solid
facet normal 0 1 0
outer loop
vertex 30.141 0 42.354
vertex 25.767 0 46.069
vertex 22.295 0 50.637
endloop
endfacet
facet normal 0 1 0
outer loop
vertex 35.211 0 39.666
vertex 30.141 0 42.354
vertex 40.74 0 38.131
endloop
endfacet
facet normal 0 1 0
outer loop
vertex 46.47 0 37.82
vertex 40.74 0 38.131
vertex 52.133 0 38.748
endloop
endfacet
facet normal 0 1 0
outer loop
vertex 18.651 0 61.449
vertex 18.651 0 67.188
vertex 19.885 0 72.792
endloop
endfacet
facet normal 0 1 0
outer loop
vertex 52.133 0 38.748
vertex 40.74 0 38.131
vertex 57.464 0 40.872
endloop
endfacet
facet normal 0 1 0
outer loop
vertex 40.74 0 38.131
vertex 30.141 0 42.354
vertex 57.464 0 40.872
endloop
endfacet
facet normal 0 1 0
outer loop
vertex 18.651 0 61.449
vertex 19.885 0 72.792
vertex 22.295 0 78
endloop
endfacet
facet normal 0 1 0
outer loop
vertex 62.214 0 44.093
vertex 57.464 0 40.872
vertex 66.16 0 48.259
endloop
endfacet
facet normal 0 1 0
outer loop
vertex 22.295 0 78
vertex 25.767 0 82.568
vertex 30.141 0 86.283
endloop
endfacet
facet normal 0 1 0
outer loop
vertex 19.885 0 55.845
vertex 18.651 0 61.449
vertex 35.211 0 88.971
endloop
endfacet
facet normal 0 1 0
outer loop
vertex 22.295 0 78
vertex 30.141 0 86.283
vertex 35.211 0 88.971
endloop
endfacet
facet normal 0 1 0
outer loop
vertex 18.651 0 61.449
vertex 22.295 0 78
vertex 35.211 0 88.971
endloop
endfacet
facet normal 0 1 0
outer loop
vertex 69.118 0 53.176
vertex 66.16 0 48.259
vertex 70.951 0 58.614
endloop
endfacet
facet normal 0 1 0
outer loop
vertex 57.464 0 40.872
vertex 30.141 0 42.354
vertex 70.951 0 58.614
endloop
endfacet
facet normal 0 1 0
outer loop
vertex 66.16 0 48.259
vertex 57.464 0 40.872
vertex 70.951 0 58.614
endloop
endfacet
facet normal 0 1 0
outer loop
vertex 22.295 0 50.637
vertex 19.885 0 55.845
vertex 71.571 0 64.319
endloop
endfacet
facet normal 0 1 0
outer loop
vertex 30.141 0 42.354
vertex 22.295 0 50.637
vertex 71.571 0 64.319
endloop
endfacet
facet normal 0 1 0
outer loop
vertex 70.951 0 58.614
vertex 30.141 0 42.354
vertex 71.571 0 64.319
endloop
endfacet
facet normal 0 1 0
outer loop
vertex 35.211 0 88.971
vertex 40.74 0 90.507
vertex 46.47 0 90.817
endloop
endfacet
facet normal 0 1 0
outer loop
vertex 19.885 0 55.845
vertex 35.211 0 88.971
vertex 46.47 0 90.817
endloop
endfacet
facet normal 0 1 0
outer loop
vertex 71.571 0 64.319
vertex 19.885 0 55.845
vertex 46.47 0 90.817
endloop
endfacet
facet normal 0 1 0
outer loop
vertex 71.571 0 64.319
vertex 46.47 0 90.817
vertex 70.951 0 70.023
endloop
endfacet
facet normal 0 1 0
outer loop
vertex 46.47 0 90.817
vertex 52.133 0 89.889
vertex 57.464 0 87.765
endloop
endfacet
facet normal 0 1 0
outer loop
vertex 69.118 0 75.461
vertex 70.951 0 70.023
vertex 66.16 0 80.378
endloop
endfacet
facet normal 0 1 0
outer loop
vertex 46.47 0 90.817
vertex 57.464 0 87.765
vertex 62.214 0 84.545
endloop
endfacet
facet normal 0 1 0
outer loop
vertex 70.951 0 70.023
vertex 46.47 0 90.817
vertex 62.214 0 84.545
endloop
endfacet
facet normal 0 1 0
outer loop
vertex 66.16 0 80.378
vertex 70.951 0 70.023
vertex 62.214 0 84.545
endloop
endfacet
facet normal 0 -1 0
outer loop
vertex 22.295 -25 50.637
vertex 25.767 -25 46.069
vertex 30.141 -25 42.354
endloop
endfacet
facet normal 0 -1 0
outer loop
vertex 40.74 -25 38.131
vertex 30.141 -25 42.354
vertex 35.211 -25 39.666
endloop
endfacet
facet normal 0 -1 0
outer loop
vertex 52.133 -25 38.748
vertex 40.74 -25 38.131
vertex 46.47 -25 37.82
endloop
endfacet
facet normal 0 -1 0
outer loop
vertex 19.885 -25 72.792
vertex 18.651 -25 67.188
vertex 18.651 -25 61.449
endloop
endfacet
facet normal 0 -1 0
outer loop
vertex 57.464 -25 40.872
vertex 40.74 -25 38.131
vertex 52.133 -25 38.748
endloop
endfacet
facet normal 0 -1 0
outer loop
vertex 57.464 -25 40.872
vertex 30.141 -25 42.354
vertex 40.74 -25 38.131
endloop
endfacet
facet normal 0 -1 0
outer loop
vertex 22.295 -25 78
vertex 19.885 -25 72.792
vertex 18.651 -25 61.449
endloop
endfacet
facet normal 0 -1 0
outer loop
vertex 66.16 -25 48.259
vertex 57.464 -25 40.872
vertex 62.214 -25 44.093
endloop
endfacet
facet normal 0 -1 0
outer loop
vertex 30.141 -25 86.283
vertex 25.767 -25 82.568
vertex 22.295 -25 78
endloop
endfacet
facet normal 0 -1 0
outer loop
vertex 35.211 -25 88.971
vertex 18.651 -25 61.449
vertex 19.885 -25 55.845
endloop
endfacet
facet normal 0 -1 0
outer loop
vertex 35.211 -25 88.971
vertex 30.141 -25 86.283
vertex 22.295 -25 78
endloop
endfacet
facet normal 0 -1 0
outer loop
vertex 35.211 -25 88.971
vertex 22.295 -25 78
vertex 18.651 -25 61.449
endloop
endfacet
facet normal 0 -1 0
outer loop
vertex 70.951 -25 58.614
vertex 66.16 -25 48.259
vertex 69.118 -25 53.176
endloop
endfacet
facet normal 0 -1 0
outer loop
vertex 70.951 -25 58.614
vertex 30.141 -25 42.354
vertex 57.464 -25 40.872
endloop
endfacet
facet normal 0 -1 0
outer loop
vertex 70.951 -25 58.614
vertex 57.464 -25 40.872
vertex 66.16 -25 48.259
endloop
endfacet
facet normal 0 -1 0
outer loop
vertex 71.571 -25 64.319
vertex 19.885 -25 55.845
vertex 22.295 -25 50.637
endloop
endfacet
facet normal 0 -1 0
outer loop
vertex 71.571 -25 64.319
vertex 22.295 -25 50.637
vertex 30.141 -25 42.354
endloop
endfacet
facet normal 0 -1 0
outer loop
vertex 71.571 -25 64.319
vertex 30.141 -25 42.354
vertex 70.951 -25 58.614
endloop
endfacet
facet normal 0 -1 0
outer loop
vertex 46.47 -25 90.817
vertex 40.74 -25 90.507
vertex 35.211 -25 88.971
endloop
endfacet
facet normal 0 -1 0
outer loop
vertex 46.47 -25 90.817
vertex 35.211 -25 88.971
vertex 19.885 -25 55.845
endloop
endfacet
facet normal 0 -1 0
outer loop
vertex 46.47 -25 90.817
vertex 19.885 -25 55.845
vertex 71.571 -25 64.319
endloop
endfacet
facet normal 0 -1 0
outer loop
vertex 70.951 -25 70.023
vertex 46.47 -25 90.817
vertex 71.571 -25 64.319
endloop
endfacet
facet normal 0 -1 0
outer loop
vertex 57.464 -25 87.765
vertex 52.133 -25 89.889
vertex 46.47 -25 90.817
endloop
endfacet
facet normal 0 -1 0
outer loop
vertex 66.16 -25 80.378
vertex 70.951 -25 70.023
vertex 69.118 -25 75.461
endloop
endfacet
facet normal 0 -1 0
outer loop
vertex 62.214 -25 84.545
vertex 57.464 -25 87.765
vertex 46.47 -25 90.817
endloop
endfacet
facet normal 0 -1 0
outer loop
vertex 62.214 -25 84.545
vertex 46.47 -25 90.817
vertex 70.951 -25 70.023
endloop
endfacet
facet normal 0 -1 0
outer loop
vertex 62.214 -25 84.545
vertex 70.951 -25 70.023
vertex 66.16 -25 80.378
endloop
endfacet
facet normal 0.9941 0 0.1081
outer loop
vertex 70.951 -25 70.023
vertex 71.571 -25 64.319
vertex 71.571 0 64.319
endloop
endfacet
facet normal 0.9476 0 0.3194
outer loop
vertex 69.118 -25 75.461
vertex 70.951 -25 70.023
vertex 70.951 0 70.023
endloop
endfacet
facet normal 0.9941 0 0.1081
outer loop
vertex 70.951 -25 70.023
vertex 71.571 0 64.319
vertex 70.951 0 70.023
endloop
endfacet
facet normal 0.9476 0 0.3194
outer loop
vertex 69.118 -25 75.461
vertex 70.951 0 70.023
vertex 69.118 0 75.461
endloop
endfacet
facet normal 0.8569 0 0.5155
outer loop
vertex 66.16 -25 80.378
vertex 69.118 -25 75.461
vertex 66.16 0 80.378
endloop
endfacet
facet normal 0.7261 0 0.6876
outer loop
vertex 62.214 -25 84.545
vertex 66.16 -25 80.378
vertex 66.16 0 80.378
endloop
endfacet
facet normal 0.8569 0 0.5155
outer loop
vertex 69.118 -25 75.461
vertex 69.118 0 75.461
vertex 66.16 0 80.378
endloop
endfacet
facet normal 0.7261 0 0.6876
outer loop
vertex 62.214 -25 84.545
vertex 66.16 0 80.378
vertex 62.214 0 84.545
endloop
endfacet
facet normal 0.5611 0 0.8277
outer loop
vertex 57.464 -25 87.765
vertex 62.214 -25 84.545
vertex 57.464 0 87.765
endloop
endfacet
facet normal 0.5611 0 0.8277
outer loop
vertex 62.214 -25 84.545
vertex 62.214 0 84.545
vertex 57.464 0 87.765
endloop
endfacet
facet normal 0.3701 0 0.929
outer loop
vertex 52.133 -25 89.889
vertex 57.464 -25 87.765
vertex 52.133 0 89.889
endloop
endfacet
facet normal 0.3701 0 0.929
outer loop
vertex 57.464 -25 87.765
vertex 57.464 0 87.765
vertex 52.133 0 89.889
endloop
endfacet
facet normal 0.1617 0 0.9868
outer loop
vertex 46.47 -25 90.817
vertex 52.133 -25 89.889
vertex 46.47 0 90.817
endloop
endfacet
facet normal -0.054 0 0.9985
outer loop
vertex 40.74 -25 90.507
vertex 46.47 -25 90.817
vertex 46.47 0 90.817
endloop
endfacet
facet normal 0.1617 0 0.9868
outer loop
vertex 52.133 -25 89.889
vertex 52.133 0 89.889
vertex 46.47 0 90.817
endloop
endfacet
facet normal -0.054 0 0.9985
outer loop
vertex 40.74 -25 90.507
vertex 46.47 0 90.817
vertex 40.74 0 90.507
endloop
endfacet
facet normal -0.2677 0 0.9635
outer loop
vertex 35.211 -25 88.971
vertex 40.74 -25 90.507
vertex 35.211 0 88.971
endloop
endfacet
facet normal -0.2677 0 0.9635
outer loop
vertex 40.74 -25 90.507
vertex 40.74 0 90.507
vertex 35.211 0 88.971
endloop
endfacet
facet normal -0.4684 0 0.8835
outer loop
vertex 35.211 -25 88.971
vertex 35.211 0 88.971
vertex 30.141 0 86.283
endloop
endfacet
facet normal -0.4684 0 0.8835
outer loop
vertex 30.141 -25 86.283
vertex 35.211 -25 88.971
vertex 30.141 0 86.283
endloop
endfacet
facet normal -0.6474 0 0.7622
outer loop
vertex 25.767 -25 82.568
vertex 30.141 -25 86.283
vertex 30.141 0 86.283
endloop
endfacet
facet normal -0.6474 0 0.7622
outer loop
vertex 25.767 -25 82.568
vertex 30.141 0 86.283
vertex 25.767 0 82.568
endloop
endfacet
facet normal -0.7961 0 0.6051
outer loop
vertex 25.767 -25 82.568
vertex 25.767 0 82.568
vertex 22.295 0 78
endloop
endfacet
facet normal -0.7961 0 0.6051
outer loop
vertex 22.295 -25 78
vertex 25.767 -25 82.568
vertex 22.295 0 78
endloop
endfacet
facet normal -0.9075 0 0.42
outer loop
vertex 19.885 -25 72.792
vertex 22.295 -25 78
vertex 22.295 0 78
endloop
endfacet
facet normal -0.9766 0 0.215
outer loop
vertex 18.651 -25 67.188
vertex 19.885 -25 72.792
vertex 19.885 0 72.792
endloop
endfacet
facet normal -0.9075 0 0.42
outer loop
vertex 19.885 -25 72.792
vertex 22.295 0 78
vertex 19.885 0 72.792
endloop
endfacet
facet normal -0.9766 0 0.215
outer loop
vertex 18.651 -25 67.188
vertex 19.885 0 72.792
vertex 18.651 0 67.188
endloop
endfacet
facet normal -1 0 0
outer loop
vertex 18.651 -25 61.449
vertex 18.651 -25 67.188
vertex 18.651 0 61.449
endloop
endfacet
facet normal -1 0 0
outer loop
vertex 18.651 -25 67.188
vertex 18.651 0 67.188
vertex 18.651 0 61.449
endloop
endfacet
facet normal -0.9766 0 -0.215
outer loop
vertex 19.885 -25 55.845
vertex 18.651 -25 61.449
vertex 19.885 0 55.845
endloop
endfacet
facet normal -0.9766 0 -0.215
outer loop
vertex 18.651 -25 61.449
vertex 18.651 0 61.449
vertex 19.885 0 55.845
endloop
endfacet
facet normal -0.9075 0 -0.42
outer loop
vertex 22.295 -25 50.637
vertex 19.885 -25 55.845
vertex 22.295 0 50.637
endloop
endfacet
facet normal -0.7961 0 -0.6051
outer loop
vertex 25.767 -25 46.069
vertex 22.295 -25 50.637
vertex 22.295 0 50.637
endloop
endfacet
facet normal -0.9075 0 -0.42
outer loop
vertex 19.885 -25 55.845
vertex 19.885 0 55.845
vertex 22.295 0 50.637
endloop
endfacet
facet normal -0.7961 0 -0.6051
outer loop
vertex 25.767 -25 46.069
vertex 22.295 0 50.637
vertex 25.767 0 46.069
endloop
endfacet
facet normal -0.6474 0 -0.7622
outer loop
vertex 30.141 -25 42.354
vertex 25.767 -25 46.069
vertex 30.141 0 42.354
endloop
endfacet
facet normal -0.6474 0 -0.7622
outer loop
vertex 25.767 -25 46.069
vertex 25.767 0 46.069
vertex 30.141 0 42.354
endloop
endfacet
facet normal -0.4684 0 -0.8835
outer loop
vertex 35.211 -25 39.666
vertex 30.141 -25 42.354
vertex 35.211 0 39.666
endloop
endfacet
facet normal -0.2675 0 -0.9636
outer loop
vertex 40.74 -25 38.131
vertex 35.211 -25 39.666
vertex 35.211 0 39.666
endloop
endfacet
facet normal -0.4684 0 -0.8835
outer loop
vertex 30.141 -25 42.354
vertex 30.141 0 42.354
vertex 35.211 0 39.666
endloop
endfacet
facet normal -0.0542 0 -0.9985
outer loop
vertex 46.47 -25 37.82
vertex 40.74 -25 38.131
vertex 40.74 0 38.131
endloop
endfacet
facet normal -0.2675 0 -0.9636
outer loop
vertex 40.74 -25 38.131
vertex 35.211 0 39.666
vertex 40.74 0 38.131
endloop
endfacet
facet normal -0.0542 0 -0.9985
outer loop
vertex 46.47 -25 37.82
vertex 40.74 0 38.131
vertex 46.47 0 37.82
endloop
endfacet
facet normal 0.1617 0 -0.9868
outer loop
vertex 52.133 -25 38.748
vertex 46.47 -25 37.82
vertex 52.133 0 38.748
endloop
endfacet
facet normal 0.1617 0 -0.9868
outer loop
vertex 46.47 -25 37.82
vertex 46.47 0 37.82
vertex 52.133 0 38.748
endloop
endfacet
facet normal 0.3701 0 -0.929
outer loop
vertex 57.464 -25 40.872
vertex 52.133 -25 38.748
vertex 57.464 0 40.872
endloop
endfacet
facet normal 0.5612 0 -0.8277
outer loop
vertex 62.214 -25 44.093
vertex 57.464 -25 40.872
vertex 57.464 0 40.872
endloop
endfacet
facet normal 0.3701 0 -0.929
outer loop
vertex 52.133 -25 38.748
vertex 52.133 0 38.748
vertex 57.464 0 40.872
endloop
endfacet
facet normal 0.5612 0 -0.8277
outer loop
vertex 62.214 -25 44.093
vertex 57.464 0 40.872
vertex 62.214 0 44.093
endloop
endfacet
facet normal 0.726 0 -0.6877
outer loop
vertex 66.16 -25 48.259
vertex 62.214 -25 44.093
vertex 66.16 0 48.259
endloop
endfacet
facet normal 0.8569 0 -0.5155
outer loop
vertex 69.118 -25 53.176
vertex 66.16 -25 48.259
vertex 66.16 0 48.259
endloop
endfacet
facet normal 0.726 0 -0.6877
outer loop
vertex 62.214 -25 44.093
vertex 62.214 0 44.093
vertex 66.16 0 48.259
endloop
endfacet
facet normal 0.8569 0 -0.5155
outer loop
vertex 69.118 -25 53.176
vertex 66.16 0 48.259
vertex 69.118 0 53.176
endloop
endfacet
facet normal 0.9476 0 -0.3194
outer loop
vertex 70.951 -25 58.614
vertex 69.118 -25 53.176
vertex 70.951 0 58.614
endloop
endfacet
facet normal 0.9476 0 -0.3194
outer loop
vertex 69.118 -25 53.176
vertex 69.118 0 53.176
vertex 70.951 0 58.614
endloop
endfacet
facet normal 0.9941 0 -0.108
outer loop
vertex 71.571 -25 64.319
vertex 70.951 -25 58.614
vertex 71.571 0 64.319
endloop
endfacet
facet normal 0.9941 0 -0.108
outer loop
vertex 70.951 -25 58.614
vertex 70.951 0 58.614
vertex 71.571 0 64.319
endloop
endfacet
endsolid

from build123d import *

# Parameters (mm, degrees)
F0_W     = 66.3625448942
F0_H     = 52.2382929921
F1_DEPTH = 25
F0_R     = 26.537616526


with BuildPart() as f1:
    # F0 (on Front) → F1 (new body)
    with BuildSketch(Plane.XZ):
        with Locations((-103.3144816756, 26.1191464961)):
            Rectangle(F0_W, F0_H)
    extrude(amount=F1_DEPTH)


with BuildPart() as f1b:
    # F0 (on Front) → F1, piece 2 (new body)
    with BuildSketch(Plane.XZ):
        with Locations((45.0334623456, 64.3185600638)):
            Circle(F0_R)
    extrude(amount=F1_DEPTH)


solid = f1b.part
